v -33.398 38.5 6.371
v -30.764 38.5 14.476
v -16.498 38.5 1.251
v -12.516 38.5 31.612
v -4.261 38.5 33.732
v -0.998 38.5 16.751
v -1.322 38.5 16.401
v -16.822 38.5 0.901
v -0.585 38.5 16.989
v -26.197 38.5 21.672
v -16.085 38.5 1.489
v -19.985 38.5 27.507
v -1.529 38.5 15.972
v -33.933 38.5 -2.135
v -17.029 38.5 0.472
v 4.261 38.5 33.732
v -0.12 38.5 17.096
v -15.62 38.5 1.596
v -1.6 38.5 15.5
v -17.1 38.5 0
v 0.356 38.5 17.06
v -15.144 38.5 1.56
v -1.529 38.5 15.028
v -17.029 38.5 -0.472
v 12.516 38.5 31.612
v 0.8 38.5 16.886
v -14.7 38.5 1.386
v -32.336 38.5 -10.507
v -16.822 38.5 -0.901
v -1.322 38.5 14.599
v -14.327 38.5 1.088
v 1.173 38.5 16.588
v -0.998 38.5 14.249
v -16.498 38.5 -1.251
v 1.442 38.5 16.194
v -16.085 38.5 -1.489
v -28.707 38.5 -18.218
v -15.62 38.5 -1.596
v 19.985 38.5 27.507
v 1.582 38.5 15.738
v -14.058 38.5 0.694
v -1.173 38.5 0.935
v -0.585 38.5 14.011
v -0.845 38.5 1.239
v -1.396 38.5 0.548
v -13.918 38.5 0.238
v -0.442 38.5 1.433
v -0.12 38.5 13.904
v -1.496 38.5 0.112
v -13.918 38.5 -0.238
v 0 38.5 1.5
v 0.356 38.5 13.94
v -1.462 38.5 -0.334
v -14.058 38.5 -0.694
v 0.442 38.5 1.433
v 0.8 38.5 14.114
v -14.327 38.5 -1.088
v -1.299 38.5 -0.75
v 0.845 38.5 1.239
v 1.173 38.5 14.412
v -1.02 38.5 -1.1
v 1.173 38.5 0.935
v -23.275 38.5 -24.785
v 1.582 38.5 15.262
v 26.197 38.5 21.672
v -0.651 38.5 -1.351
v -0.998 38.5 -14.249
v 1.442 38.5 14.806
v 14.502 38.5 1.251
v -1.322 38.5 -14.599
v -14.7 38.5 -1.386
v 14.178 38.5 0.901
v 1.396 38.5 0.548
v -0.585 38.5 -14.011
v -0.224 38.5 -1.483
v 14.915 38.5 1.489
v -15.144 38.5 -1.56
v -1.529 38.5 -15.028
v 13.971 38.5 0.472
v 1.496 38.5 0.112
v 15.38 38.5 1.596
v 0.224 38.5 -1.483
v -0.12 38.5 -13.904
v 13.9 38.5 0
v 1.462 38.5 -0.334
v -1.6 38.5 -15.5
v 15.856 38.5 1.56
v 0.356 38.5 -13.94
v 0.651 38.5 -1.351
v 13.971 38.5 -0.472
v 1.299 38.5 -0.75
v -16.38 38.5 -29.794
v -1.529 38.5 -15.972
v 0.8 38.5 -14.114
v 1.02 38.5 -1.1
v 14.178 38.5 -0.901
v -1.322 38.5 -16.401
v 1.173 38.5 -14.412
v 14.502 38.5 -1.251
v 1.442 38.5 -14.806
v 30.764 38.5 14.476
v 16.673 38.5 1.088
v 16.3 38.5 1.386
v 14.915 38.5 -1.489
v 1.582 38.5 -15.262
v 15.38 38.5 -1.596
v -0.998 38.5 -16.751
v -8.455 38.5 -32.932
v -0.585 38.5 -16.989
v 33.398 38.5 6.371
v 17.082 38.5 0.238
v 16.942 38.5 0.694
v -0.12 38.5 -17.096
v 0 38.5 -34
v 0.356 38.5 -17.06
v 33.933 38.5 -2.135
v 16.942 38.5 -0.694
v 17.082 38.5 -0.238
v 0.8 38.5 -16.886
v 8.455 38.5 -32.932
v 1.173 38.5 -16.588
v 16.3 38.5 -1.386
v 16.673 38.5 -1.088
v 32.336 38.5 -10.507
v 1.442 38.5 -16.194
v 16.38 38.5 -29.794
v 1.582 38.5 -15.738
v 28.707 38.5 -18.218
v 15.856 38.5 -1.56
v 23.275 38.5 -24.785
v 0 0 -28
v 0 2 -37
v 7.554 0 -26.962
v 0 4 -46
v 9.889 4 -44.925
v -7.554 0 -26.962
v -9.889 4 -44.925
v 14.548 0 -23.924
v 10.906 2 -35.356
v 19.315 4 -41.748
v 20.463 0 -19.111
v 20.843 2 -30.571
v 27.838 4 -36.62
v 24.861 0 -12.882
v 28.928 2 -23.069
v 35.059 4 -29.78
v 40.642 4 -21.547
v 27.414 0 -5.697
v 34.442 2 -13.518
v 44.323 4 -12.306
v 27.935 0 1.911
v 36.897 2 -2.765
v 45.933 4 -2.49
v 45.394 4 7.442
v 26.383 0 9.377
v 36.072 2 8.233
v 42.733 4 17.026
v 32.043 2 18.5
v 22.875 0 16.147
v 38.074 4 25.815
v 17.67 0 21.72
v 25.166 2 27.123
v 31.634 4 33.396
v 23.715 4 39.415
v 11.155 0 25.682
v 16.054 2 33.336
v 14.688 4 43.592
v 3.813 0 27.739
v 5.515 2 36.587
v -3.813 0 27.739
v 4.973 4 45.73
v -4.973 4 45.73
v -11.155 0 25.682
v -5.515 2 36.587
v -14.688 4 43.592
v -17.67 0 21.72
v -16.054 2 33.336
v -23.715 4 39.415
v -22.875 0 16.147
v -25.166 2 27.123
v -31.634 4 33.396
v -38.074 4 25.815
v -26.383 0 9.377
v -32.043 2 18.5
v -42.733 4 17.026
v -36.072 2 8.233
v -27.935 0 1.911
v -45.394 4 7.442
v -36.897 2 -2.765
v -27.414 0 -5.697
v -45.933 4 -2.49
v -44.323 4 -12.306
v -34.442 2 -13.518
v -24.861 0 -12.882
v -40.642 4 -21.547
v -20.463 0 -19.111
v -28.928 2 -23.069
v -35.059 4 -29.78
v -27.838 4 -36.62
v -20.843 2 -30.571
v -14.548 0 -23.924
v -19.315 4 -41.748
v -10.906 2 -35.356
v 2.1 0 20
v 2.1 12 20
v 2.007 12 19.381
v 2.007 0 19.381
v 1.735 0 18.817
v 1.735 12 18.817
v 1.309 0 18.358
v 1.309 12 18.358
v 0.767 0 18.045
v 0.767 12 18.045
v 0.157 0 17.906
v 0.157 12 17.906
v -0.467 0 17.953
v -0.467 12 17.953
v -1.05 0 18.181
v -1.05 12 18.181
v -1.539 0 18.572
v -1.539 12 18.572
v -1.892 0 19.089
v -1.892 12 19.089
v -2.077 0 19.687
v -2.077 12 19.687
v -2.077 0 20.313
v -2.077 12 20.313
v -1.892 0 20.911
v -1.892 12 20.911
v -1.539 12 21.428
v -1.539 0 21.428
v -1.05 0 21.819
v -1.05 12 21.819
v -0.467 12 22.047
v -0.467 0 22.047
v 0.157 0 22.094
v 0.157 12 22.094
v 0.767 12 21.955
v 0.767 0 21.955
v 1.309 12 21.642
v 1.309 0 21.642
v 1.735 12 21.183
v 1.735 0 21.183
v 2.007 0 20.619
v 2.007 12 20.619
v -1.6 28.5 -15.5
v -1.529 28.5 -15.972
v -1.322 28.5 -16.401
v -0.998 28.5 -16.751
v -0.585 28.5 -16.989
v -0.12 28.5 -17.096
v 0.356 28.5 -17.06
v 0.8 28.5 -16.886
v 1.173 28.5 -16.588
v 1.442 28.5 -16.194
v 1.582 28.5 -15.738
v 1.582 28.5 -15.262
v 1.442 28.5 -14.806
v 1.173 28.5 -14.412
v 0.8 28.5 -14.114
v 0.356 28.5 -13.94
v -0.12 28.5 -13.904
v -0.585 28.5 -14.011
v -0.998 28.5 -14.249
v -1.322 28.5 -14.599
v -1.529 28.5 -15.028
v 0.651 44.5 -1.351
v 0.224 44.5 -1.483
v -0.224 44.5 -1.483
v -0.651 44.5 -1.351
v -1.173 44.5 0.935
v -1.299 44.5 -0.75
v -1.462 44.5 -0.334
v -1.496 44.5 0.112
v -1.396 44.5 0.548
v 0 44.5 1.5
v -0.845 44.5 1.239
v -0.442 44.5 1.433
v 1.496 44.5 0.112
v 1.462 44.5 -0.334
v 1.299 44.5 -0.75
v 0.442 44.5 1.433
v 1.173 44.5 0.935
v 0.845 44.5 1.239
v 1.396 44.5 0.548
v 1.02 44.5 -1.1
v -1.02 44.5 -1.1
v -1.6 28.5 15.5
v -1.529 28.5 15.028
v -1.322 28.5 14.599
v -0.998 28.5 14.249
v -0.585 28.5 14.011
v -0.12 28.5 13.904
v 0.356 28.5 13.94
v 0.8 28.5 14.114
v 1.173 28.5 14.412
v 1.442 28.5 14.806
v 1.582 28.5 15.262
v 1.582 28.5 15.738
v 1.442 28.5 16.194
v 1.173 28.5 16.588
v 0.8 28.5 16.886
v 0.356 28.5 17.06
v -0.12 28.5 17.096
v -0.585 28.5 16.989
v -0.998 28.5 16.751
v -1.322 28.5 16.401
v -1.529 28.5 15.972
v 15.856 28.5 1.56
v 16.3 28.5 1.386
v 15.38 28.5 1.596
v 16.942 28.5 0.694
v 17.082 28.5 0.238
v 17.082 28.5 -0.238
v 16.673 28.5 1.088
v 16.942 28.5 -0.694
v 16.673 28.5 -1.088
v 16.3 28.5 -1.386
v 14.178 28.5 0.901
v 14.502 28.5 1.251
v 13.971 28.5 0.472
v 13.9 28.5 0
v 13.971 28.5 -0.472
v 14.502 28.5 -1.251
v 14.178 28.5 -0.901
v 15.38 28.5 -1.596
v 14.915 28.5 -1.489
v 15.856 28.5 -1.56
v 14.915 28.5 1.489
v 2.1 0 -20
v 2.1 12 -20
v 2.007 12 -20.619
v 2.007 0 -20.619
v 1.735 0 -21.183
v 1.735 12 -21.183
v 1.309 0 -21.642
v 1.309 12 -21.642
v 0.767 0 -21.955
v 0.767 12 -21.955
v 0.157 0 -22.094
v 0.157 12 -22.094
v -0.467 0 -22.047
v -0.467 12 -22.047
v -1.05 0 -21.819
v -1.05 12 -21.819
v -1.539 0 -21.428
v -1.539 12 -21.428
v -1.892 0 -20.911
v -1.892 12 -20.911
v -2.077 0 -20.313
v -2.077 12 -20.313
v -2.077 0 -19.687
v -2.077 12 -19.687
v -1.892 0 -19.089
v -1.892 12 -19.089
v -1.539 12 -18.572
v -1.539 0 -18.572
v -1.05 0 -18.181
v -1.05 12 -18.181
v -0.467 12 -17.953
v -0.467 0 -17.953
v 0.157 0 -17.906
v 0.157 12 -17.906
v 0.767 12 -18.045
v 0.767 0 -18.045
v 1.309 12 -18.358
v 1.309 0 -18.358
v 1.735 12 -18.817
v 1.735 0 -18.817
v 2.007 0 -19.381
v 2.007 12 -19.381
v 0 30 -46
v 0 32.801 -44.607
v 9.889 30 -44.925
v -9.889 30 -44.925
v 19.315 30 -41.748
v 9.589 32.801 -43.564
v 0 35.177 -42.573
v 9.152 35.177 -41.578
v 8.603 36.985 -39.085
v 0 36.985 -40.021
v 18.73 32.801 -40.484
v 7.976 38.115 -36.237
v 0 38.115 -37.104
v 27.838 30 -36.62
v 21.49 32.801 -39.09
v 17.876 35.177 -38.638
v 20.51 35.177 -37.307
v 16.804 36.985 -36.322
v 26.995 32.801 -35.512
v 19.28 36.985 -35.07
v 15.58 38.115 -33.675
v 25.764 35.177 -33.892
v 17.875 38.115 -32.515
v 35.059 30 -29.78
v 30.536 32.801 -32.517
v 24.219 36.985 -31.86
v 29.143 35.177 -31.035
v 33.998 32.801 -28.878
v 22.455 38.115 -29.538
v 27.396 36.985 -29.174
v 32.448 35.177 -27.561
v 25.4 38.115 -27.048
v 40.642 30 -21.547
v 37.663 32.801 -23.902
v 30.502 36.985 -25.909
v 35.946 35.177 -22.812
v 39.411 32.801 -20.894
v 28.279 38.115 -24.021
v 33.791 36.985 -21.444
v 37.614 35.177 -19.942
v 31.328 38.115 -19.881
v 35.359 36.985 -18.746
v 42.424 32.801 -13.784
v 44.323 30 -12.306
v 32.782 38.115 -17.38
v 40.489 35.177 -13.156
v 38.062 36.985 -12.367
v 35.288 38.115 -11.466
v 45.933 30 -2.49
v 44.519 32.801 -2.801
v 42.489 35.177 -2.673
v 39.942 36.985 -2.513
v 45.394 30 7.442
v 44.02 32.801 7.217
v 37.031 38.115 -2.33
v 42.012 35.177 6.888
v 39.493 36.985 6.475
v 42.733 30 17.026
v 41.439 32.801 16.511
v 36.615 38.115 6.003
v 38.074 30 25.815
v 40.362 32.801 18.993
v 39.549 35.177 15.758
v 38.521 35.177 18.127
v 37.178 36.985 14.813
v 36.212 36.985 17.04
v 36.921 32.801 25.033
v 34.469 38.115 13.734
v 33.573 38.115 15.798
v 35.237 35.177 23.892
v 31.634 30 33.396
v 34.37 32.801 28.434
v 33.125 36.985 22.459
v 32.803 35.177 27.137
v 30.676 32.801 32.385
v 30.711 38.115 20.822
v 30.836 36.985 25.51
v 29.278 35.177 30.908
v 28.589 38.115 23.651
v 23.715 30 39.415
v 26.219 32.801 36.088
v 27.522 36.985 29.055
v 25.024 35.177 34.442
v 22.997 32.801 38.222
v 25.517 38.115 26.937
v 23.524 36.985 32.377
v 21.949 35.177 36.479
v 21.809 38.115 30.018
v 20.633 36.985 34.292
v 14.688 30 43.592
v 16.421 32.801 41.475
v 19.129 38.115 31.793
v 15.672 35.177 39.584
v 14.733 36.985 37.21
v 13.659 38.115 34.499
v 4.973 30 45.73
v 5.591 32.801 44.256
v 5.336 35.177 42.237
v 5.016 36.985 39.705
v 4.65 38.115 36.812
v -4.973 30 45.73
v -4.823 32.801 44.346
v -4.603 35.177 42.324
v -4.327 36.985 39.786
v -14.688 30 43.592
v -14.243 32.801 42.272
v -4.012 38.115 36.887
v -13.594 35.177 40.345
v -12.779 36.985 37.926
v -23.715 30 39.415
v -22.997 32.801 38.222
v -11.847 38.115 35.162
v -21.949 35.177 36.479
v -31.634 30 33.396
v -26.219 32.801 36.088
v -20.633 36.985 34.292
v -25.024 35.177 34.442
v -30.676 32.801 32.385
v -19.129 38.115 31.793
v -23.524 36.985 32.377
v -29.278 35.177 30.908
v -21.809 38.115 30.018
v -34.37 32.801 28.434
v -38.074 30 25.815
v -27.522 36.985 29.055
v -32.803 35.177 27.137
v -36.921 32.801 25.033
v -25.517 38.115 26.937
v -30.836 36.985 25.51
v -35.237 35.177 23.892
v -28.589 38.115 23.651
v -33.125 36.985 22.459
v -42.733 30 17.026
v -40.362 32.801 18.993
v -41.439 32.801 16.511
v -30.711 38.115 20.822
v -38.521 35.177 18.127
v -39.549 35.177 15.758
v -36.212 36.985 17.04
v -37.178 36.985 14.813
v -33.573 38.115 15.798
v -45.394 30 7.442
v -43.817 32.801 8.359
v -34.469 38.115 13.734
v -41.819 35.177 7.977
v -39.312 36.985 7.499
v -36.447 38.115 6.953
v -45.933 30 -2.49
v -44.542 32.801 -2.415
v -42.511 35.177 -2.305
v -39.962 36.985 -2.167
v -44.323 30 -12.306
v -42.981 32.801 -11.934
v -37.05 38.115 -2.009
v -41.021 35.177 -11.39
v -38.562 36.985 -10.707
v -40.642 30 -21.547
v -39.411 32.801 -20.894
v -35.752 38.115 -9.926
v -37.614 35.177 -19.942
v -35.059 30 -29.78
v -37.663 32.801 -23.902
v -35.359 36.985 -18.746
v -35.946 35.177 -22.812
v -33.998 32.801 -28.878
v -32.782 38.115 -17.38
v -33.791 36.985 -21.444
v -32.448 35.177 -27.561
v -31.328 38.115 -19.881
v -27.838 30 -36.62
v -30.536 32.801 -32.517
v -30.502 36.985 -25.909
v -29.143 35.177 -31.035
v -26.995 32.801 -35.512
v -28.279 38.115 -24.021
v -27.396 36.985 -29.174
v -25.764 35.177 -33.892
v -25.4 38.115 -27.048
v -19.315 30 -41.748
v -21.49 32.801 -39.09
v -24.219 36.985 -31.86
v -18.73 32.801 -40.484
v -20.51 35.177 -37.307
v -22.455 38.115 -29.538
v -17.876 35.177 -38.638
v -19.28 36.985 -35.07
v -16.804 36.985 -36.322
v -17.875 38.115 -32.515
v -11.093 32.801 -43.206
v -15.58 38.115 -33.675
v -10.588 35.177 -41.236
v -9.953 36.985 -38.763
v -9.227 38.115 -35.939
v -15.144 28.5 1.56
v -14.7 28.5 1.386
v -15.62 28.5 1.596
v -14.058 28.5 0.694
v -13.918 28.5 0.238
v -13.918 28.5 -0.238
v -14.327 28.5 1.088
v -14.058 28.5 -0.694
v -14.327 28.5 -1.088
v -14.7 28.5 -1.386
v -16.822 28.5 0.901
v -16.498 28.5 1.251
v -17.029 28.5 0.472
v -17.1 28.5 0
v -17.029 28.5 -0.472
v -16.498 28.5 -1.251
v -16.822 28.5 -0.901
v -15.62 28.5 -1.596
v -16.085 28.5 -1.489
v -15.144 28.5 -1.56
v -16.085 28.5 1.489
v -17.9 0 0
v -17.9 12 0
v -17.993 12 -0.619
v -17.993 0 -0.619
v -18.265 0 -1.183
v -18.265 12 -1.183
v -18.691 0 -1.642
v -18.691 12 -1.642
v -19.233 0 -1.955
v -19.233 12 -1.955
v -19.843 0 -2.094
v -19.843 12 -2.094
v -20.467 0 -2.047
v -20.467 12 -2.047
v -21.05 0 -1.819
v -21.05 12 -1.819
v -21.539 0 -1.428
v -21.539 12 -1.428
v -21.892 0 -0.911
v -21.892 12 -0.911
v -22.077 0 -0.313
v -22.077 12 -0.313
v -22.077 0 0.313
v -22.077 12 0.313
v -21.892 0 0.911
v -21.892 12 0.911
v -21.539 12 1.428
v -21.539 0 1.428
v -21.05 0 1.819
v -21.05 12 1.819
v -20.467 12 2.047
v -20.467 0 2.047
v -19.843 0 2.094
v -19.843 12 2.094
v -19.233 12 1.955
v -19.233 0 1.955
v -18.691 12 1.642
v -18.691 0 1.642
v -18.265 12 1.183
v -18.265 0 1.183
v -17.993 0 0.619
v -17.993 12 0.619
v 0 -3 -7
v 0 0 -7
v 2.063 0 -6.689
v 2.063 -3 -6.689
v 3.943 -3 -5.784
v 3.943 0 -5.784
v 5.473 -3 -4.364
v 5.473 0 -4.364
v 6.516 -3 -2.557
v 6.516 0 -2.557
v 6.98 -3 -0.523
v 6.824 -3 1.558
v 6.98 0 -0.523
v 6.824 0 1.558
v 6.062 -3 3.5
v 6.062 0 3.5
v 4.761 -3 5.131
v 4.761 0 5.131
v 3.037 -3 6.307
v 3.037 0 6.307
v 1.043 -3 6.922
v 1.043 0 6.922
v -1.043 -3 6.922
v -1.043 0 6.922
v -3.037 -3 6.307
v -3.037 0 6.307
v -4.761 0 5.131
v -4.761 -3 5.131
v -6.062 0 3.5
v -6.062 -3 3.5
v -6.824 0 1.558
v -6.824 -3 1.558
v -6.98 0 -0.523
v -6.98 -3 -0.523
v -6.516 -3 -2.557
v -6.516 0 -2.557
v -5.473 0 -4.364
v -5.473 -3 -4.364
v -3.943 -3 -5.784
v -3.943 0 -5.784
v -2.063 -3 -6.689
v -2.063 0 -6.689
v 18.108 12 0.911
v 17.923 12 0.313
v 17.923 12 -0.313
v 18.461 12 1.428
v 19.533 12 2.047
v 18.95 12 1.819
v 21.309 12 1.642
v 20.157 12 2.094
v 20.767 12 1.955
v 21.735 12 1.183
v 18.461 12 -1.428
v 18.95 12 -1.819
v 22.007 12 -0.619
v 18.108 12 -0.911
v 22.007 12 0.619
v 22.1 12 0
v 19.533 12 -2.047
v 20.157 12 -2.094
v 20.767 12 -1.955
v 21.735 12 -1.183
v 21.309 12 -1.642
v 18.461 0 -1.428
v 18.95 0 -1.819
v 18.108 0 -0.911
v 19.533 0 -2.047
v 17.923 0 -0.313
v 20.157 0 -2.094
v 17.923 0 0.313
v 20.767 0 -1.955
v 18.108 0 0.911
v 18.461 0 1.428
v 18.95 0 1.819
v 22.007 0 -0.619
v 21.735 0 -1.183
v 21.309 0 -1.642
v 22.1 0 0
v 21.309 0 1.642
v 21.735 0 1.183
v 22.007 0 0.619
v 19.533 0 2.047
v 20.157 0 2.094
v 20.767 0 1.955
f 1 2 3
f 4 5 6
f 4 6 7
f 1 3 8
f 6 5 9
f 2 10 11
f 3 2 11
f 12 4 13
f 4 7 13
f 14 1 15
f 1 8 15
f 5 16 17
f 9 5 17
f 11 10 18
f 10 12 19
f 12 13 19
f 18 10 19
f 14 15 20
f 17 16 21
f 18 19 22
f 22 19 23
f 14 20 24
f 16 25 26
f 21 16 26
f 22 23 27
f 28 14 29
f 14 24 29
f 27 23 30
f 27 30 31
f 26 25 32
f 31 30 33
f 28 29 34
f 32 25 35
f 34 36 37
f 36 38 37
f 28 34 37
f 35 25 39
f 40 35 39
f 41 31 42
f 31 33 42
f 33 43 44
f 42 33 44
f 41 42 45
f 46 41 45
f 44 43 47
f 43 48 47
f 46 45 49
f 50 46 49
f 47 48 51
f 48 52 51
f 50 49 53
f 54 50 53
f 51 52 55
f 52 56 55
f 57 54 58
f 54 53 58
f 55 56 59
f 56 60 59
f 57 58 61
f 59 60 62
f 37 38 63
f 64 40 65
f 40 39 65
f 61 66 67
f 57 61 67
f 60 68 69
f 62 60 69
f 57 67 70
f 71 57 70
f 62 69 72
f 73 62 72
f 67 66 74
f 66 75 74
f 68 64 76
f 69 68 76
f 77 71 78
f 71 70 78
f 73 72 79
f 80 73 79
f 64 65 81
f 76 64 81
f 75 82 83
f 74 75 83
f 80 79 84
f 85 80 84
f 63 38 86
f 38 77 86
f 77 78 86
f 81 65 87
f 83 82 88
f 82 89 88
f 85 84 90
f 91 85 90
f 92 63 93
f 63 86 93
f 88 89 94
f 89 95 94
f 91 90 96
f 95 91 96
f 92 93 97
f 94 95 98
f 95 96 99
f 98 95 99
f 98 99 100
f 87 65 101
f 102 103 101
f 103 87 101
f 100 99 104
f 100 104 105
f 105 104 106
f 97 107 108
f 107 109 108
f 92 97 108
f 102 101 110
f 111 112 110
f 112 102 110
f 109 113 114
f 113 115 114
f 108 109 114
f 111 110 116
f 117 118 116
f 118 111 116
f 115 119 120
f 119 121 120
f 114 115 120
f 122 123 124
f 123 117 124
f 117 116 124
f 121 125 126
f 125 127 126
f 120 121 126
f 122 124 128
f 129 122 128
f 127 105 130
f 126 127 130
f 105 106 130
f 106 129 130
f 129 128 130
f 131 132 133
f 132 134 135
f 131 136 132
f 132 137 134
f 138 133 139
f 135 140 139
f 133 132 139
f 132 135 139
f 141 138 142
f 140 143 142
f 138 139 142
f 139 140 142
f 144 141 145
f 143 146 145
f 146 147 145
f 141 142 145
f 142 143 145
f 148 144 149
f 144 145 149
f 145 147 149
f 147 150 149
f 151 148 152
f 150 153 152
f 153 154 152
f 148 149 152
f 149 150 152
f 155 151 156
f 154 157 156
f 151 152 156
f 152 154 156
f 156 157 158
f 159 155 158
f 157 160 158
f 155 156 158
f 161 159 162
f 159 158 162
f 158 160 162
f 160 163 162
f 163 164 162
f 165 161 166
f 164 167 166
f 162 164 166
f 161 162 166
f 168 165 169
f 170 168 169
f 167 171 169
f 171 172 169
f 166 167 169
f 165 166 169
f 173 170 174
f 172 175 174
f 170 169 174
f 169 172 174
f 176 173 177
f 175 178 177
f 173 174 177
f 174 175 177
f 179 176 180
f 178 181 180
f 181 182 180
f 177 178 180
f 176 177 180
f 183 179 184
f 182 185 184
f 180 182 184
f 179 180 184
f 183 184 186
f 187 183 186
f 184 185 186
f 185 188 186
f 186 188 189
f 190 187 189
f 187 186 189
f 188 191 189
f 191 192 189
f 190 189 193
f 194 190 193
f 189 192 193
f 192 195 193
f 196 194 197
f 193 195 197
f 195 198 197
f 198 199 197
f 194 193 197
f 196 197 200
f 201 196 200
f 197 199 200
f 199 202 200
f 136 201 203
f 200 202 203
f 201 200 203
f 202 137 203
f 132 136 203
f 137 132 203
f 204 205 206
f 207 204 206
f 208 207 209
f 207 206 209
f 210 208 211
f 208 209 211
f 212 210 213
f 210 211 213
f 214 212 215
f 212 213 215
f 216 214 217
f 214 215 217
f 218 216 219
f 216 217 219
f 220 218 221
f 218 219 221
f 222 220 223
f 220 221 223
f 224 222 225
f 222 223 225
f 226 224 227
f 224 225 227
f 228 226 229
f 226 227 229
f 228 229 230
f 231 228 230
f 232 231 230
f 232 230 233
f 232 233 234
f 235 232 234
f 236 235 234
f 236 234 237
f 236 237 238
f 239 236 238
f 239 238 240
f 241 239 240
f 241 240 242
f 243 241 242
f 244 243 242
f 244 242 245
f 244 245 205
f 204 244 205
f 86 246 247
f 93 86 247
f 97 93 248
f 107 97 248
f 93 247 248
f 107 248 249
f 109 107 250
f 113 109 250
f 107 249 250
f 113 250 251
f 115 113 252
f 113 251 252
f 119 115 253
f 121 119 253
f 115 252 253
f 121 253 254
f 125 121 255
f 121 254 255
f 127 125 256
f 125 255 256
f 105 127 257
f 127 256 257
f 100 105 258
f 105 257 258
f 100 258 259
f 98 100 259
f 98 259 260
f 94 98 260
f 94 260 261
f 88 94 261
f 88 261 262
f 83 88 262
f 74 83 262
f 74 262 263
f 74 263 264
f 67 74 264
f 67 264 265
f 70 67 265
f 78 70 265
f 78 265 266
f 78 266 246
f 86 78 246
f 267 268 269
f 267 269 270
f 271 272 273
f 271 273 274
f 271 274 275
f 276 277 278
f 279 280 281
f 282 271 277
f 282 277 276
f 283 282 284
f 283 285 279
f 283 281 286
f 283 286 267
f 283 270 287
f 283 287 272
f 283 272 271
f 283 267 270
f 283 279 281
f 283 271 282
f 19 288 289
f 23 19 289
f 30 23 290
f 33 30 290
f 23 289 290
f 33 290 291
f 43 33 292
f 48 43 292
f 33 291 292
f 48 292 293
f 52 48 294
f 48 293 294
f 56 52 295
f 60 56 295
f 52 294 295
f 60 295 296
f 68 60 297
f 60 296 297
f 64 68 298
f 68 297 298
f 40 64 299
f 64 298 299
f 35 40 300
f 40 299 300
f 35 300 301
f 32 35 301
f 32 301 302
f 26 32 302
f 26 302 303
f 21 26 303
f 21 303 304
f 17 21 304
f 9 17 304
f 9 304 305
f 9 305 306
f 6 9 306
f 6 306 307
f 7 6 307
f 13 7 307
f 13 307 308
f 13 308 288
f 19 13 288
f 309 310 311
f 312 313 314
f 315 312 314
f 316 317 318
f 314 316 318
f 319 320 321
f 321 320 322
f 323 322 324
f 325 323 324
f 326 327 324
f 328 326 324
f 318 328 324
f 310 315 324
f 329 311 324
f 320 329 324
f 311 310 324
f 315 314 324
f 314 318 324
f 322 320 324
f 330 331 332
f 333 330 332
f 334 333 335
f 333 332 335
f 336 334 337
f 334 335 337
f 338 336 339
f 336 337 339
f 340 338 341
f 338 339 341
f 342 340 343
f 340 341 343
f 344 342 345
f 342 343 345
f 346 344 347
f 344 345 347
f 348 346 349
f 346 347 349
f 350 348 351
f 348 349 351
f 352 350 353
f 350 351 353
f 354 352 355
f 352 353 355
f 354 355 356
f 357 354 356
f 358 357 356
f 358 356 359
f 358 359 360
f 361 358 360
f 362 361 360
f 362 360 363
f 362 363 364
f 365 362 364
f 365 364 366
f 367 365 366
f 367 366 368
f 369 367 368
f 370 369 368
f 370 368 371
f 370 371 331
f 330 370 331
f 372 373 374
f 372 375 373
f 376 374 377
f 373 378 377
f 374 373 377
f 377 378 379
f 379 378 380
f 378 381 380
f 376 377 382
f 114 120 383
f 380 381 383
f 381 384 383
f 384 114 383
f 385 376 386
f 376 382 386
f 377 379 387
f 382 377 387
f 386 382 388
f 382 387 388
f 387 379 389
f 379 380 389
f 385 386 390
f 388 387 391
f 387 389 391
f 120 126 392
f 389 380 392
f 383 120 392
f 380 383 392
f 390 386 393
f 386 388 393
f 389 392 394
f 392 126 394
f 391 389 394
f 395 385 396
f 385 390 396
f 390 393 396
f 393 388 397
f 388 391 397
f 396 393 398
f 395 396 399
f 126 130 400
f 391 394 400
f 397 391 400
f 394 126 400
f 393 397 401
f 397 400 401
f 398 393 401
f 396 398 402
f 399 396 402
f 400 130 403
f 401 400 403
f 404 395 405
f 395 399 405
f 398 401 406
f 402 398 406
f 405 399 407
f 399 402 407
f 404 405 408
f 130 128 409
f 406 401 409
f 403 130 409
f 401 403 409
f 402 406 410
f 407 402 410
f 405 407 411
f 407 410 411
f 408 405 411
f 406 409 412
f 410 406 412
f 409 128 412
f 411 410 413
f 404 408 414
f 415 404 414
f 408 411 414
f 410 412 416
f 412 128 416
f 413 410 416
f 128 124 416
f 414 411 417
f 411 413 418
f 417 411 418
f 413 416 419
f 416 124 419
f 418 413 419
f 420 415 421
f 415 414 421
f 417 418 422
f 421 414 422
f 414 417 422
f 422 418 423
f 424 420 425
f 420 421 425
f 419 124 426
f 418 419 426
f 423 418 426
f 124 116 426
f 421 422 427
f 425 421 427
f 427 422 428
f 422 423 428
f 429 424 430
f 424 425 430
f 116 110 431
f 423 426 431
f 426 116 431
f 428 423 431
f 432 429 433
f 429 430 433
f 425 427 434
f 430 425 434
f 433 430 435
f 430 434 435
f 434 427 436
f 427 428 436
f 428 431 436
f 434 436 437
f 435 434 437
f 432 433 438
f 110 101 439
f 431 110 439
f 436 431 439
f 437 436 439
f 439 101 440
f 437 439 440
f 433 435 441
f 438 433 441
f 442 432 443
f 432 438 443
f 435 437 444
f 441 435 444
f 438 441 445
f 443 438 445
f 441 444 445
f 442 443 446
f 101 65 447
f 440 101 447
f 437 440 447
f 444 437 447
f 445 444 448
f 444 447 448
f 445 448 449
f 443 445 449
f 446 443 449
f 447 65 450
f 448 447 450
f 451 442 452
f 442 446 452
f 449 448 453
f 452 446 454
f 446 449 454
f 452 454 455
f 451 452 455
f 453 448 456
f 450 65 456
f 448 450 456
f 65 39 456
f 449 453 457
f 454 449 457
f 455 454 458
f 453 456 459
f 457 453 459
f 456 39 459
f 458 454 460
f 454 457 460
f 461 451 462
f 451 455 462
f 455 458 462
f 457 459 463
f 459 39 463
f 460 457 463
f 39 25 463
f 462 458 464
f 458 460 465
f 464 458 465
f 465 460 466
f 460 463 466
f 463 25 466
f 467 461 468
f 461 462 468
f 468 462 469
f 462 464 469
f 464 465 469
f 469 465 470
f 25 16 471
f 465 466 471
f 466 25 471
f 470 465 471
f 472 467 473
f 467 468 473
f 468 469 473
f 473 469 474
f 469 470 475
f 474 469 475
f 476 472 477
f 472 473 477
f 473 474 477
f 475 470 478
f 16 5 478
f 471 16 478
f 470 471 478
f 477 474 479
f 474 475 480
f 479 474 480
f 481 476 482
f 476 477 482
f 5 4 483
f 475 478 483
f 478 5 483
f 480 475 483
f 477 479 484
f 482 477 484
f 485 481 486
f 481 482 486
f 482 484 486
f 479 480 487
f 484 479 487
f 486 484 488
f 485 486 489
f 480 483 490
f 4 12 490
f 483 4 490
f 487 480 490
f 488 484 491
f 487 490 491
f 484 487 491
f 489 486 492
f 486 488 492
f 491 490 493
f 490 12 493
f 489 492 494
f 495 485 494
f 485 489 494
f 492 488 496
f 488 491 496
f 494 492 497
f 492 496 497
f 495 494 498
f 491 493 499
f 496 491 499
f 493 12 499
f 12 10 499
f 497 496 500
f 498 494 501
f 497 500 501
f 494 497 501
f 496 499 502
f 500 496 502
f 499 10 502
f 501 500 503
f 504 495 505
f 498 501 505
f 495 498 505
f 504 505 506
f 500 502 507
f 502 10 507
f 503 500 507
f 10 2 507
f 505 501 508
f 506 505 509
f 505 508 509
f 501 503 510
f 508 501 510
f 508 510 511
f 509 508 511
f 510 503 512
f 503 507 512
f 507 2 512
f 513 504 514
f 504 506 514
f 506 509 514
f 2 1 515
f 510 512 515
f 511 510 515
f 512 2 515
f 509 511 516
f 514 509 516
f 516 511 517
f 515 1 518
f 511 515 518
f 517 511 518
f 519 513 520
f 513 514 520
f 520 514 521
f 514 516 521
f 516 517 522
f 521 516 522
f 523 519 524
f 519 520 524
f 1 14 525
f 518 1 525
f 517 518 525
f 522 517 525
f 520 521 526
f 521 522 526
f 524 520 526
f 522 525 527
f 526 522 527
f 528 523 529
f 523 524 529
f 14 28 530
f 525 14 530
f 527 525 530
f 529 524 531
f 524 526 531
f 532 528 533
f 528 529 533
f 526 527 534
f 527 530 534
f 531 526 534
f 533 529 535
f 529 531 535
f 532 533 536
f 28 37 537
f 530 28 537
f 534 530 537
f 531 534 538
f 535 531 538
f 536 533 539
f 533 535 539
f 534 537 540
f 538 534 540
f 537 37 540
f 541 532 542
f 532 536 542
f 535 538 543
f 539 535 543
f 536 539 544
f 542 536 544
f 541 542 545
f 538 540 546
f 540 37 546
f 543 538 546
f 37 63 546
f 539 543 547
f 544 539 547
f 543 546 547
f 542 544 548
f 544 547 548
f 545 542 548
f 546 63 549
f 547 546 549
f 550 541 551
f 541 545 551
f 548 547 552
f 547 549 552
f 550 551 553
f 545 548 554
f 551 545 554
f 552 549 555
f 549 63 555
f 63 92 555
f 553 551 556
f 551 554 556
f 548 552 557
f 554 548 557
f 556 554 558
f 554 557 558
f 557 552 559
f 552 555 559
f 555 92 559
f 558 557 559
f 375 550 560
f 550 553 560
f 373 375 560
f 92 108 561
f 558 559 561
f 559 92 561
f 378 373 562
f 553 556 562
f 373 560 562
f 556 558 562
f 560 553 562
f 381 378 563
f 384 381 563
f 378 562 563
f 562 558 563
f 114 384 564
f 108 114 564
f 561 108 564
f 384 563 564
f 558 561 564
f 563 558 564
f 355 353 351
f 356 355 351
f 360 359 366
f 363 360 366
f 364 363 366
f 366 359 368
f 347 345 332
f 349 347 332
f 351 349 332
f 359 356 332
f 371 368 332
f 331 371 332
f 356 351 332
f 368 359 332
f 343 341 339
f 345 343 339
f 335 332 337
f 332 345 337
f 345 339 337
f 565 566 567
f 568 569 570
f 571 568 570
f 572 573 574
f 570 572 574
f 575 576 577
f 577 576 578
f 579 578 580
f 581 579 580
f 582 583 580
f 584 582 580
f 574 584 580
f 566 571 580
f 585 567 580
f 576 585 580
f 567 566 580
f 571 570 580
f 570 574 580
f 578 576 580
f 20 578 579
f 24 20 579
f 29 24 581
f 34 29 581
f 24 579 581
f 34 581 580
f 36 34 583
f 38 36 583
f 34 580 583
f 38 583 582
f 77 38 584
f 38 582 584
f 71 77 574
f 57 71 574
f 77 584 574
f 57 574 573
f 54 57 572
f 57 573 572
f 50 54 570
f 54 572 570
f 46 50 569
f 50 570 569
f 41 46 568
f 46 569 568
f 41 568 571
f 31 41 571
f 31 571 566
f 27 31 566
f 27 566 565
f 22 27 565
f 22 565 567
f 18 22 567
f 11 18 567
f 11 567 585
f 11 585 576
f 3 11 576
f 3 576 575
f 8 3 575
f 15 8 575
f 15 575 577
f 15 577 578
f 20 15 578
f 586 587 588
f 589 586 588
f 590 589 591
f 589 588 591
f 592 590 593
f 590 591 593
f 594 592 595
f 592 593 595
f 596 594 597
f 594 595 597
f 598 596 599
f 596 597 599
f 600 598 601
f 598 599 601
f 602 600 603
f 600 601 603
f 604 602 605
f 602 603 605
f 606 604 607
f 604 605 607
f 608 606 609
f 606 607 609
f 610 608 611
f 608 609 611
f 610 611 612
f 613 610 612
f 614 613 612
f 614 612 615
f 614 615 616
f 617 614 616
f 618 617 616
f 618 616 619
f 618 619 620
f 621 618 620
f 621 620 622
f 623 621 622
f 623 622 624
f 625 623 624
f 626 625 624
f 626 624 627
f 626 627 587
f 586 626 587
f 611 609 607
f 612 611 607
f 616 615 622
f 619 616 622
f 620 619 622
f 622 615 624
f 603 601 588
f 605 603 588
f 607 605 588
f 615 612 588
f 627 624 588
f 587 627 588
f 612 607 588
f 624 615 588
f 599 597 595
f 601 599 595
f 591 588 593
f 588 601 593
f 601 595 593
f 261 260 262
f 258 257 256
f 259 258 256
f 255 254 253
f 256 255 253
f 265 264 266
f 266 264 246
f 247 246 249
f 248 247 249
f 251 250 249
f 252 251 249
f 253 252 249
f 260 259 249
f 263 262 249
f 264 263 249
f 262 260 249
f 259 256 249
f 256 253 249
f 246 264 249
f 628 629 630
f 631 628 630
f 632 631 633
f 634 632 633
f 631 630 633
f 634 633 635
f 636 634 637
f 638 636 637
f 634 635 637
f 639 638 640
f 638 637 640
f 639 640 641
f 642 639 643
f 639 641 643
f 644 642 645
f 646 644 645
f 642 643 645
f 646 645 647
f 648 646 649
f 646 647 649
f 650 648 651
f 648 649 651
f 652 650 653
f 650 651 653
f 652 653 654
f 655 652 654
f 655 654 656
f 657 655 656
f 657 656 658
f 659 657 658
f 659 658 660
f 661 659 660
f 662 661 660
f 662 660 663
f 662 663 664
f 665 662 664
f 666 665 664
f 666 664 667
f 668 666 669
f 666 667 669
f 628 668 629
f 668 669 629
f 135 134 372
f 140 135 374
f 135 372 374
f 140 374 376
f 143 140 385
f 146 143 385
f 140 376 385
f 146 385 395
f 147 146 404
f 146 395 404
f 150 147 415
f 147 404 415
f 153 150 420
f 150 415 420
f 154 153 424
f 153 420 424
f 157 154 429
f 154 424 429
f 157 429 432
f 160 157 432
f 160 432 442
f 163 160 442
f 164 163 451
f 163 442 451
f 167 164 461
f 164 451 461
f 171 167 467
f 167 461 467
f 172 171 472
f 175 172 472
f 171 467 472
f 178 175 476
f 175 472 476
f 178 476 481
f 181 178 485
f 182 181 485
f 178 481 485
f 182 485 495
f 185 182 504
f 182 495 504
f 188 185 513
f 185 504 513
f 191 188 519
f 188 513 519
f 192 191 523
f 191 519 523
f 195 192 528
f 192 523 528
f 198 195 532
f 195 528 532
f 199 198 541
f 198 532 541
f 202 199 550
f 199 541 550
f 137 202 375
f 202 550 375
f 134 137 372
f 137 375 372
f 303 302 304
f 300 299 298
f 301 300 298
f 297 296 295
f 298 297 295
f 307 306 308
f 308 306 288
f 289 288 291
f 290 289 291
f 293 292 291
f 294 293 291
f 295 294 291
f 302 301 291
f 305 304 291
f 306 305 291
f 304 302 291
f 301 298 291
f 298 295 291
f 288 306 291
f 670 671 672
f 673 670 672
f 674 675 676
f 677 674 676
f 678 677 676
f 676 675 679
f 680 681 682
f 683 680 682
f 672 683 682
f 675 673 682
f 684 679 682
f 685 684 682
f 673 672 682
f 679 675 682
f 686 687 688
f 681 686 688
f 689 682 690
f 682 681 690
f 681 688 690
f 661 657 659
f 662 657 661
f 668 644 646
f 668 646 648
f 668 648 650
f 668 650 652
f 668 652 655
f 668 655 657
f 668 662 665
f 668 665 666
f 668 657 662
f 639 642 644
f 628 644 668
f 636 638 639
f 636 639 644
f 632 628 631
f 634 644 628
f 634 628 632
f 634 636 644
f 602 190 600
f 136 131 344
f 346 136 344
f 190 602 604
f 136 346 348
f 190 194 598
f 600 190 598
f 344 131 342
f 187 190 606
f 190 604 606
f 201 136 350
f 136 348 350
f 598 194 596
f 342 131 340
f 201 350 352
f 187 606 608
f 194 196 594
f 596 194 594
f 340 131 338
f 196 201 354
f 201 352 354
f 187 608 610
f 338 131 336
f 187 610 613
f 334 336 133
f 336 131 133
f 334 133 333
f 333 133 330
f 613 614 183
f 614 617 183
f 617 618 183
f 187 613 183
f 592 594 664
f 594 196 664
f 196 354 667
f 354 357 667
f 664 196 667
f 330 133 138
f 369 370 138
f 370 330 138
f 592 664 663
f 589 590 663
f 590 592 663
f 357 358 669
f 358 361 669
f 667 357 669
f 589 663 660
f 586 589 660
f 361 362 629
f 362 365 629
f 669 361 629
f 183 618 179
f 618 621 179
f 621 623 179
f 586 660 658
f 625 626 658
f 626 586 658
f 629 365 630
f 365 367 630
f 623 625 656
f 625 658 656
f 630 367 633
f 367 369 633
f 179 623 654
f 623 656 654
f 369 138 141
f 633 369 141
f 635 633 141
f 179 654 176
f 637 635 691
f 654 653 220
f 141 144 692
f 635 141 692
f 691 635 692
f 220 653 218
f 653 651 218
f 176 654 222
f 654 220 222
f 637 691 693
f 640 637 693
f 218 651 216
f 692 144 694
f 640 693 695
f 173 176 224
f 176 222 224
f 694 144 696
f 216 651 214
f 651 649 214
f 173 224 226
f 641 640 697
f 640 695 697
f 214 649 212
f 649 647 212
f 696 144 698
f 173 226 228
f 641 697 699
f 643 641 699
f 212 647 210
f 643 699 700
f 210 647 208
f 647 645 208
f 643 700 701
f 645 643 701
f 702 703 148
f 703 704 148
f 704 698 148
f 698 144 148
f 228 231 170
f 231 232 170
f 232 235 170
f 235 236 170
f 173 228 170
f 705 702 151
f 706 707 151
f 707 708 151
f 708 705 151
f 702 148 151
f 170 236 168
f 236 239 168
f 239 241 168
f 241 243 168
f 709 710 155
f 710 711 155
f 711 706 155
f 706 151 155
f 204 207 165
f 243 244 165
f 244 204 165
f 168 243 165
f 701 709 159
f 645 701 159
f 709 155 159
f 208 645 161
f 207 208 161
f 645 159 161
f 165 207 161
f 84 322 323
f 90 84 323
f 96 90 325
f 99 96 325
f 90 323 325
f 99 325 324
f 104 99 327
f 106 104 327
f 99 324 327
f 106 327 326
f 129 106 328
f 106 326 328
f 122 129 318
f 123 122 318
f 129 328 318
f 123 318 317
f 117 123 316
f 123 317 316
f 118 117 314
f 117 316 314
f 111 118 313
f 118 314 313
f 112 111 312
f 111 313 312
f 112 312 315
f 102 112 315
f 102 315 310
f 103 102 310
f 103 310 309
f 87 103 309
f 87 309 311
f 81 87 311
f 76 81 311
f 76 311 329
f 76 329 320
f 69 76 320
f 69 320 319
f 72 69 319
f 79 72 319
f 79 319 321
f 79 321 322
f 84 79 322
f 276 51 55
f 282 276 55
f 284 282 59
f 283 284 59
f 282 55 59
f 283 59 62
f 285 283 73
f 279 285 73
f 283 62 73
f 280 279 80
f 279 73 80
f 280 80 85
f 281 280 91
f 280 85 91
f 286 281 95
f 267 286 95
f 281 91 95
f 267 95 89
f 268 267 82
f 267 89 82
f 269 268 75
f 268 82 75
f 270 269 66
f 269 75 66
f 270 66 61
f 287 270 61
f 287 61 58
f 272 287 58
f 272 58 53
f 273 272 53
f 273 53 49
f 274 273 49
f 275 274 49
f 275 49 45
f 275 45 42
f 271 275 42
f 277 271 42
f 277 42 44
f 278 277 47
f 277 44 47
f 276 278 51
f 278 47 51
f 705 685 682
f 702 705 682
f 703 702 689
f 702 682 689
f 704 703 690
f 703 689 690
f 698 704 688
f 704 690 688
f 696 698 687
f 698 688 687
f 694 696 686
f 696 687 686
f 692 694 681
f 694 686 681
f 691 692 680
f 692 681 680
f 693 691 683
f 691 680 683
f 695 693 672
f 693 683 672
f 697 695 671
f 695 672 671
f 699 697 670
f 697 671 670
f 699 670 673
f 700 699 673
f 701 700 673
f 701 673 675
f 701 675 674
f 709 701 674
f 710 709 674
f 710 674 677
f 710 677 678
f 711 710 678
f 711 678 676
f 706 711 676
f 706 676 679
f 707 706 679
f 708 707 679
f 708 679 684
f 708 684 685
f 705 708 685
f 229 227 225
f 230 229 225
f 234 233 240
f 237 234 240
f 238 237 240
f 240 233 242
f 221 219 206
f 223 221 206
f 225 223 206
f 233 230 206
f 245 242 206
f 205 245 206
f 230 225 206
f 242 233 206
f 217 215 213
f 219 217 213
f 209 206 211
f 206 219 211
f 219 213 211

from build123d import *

# Parameters (mm, degrees)
CROQUIS2_R                          = 7
SALIENTE_EXTRUIR1_DEPTH             = 3
CROQUIS3_R                          = 1.5
SALIENTE_EXTRUIR2_DEPTH             = 6
DI_METRO_DE_TALADRO_3_2_3_2_1_D     = 3.2
DI_METRO_DE_TALADRO_3_2_3_2_1_DEPTH = 10
DI_METRO_DE_TALADRO_4_2_4_2_1_D     = 4.2
DI_METRO_DE_TALADRO_4_2_4_2_1_DEPTH = 12
CHAFL_N1_SIZE                       = 18
CHAFL_N1_SIZE2                      = 4


with BuildPart() as part:
    # Croquis1 → Revolución1 (revolve)
    with BuildSketch(Plane.XY, mode=Mode.PRIVATE) as revoluci_n1_sk:
        with BuildLine():
            Line((34, 38.5), (0, 38.5))
            Line((0, 38.5), (0, 0))
            Line((0, 0), (46, 0))
            Line((46, 0), (46, 30))
            ThreePointArc((46, 30), (41.352720585, 36.159723179), (34, 38.5))
        make_face()
    revolve(revoluci_n1_sk.sketch.rotate(Axis((0, 38.5, 0), (0, -1, 0)), 270), axis=Axis((0, 38.5, 0), (0, -1, 0)))

    # Croquis2 → Saliente-Extruir1 (add)
    with BuildSketch(Plane.XZ):
        with Locations(Location((0, 0, 0), (0, 0, 270))):
            Circle(CROQUIS2_R)
    extrude(amount=SALIENTE_EXTRUIR1_DEPTH)

    # Croquis3 → Saliente-Extruir2 (add)
    with BuildSketch(Plane(origin=(0, 38.5, 0), x_dir=(-1, 0, 0), z_dir=(0, 1, 0))):
        with Locations(Location((0, 0, 0), (0, 0, 90))):
            Circle(CROQUIS3_R)
    extrude(amount=SALIENTE_EXTRUIR2_DEPTH)

    # Diámetro de taladro Ø3.2 (3.2)1
    with Locations(Plane(origin=(0, 38.5, 0), x_dir=(1, 0, 0), z_dir=(0, 1, 0))):
        with Locations((0, 15.5), (-15.5, 0), (15.5, 0), (0, -15.5)):
            Hole(DI_METRO_DE_TALADRO_3_2_3_2_1_D / 2, depth=DI_METRO_DE_TALADRO_3_2_3_2_1_DEPTH)

    # Diámetro de taladro Ø4.2 (4.2)1
    with Locations(Plane(origin=(0, 0, 0), x_dir=(-1, 0, 0), z_dir=(0, -1, 0))):
        with Locations((0, -20), (20, 0), (-20, 0), (0, 20)):
            Hole(DI_METRO_DE_TALADRO_4_2_4_2_1_D / 2, depth=DI_METRO_DE_TALADRO_4_2_4_2_1_DEPTH)

    # Chaflán1
    chafl_n1_edges = [part.edges().sort_by_distance(p)[0] for p in [
        (0, 0, 46),
    ]]
    chafl_n1_side = [part.faces().sort_by_distance(p)[0] for p in [
        (0, 0, 44.698923523),
    ]]
    chamfer(chafl_n1_edges, length=CHAFL_N1_SIZE, length2=CHAFL_N1_SIZE2, reference=chafl_n1_side[0])


solid = part.part
